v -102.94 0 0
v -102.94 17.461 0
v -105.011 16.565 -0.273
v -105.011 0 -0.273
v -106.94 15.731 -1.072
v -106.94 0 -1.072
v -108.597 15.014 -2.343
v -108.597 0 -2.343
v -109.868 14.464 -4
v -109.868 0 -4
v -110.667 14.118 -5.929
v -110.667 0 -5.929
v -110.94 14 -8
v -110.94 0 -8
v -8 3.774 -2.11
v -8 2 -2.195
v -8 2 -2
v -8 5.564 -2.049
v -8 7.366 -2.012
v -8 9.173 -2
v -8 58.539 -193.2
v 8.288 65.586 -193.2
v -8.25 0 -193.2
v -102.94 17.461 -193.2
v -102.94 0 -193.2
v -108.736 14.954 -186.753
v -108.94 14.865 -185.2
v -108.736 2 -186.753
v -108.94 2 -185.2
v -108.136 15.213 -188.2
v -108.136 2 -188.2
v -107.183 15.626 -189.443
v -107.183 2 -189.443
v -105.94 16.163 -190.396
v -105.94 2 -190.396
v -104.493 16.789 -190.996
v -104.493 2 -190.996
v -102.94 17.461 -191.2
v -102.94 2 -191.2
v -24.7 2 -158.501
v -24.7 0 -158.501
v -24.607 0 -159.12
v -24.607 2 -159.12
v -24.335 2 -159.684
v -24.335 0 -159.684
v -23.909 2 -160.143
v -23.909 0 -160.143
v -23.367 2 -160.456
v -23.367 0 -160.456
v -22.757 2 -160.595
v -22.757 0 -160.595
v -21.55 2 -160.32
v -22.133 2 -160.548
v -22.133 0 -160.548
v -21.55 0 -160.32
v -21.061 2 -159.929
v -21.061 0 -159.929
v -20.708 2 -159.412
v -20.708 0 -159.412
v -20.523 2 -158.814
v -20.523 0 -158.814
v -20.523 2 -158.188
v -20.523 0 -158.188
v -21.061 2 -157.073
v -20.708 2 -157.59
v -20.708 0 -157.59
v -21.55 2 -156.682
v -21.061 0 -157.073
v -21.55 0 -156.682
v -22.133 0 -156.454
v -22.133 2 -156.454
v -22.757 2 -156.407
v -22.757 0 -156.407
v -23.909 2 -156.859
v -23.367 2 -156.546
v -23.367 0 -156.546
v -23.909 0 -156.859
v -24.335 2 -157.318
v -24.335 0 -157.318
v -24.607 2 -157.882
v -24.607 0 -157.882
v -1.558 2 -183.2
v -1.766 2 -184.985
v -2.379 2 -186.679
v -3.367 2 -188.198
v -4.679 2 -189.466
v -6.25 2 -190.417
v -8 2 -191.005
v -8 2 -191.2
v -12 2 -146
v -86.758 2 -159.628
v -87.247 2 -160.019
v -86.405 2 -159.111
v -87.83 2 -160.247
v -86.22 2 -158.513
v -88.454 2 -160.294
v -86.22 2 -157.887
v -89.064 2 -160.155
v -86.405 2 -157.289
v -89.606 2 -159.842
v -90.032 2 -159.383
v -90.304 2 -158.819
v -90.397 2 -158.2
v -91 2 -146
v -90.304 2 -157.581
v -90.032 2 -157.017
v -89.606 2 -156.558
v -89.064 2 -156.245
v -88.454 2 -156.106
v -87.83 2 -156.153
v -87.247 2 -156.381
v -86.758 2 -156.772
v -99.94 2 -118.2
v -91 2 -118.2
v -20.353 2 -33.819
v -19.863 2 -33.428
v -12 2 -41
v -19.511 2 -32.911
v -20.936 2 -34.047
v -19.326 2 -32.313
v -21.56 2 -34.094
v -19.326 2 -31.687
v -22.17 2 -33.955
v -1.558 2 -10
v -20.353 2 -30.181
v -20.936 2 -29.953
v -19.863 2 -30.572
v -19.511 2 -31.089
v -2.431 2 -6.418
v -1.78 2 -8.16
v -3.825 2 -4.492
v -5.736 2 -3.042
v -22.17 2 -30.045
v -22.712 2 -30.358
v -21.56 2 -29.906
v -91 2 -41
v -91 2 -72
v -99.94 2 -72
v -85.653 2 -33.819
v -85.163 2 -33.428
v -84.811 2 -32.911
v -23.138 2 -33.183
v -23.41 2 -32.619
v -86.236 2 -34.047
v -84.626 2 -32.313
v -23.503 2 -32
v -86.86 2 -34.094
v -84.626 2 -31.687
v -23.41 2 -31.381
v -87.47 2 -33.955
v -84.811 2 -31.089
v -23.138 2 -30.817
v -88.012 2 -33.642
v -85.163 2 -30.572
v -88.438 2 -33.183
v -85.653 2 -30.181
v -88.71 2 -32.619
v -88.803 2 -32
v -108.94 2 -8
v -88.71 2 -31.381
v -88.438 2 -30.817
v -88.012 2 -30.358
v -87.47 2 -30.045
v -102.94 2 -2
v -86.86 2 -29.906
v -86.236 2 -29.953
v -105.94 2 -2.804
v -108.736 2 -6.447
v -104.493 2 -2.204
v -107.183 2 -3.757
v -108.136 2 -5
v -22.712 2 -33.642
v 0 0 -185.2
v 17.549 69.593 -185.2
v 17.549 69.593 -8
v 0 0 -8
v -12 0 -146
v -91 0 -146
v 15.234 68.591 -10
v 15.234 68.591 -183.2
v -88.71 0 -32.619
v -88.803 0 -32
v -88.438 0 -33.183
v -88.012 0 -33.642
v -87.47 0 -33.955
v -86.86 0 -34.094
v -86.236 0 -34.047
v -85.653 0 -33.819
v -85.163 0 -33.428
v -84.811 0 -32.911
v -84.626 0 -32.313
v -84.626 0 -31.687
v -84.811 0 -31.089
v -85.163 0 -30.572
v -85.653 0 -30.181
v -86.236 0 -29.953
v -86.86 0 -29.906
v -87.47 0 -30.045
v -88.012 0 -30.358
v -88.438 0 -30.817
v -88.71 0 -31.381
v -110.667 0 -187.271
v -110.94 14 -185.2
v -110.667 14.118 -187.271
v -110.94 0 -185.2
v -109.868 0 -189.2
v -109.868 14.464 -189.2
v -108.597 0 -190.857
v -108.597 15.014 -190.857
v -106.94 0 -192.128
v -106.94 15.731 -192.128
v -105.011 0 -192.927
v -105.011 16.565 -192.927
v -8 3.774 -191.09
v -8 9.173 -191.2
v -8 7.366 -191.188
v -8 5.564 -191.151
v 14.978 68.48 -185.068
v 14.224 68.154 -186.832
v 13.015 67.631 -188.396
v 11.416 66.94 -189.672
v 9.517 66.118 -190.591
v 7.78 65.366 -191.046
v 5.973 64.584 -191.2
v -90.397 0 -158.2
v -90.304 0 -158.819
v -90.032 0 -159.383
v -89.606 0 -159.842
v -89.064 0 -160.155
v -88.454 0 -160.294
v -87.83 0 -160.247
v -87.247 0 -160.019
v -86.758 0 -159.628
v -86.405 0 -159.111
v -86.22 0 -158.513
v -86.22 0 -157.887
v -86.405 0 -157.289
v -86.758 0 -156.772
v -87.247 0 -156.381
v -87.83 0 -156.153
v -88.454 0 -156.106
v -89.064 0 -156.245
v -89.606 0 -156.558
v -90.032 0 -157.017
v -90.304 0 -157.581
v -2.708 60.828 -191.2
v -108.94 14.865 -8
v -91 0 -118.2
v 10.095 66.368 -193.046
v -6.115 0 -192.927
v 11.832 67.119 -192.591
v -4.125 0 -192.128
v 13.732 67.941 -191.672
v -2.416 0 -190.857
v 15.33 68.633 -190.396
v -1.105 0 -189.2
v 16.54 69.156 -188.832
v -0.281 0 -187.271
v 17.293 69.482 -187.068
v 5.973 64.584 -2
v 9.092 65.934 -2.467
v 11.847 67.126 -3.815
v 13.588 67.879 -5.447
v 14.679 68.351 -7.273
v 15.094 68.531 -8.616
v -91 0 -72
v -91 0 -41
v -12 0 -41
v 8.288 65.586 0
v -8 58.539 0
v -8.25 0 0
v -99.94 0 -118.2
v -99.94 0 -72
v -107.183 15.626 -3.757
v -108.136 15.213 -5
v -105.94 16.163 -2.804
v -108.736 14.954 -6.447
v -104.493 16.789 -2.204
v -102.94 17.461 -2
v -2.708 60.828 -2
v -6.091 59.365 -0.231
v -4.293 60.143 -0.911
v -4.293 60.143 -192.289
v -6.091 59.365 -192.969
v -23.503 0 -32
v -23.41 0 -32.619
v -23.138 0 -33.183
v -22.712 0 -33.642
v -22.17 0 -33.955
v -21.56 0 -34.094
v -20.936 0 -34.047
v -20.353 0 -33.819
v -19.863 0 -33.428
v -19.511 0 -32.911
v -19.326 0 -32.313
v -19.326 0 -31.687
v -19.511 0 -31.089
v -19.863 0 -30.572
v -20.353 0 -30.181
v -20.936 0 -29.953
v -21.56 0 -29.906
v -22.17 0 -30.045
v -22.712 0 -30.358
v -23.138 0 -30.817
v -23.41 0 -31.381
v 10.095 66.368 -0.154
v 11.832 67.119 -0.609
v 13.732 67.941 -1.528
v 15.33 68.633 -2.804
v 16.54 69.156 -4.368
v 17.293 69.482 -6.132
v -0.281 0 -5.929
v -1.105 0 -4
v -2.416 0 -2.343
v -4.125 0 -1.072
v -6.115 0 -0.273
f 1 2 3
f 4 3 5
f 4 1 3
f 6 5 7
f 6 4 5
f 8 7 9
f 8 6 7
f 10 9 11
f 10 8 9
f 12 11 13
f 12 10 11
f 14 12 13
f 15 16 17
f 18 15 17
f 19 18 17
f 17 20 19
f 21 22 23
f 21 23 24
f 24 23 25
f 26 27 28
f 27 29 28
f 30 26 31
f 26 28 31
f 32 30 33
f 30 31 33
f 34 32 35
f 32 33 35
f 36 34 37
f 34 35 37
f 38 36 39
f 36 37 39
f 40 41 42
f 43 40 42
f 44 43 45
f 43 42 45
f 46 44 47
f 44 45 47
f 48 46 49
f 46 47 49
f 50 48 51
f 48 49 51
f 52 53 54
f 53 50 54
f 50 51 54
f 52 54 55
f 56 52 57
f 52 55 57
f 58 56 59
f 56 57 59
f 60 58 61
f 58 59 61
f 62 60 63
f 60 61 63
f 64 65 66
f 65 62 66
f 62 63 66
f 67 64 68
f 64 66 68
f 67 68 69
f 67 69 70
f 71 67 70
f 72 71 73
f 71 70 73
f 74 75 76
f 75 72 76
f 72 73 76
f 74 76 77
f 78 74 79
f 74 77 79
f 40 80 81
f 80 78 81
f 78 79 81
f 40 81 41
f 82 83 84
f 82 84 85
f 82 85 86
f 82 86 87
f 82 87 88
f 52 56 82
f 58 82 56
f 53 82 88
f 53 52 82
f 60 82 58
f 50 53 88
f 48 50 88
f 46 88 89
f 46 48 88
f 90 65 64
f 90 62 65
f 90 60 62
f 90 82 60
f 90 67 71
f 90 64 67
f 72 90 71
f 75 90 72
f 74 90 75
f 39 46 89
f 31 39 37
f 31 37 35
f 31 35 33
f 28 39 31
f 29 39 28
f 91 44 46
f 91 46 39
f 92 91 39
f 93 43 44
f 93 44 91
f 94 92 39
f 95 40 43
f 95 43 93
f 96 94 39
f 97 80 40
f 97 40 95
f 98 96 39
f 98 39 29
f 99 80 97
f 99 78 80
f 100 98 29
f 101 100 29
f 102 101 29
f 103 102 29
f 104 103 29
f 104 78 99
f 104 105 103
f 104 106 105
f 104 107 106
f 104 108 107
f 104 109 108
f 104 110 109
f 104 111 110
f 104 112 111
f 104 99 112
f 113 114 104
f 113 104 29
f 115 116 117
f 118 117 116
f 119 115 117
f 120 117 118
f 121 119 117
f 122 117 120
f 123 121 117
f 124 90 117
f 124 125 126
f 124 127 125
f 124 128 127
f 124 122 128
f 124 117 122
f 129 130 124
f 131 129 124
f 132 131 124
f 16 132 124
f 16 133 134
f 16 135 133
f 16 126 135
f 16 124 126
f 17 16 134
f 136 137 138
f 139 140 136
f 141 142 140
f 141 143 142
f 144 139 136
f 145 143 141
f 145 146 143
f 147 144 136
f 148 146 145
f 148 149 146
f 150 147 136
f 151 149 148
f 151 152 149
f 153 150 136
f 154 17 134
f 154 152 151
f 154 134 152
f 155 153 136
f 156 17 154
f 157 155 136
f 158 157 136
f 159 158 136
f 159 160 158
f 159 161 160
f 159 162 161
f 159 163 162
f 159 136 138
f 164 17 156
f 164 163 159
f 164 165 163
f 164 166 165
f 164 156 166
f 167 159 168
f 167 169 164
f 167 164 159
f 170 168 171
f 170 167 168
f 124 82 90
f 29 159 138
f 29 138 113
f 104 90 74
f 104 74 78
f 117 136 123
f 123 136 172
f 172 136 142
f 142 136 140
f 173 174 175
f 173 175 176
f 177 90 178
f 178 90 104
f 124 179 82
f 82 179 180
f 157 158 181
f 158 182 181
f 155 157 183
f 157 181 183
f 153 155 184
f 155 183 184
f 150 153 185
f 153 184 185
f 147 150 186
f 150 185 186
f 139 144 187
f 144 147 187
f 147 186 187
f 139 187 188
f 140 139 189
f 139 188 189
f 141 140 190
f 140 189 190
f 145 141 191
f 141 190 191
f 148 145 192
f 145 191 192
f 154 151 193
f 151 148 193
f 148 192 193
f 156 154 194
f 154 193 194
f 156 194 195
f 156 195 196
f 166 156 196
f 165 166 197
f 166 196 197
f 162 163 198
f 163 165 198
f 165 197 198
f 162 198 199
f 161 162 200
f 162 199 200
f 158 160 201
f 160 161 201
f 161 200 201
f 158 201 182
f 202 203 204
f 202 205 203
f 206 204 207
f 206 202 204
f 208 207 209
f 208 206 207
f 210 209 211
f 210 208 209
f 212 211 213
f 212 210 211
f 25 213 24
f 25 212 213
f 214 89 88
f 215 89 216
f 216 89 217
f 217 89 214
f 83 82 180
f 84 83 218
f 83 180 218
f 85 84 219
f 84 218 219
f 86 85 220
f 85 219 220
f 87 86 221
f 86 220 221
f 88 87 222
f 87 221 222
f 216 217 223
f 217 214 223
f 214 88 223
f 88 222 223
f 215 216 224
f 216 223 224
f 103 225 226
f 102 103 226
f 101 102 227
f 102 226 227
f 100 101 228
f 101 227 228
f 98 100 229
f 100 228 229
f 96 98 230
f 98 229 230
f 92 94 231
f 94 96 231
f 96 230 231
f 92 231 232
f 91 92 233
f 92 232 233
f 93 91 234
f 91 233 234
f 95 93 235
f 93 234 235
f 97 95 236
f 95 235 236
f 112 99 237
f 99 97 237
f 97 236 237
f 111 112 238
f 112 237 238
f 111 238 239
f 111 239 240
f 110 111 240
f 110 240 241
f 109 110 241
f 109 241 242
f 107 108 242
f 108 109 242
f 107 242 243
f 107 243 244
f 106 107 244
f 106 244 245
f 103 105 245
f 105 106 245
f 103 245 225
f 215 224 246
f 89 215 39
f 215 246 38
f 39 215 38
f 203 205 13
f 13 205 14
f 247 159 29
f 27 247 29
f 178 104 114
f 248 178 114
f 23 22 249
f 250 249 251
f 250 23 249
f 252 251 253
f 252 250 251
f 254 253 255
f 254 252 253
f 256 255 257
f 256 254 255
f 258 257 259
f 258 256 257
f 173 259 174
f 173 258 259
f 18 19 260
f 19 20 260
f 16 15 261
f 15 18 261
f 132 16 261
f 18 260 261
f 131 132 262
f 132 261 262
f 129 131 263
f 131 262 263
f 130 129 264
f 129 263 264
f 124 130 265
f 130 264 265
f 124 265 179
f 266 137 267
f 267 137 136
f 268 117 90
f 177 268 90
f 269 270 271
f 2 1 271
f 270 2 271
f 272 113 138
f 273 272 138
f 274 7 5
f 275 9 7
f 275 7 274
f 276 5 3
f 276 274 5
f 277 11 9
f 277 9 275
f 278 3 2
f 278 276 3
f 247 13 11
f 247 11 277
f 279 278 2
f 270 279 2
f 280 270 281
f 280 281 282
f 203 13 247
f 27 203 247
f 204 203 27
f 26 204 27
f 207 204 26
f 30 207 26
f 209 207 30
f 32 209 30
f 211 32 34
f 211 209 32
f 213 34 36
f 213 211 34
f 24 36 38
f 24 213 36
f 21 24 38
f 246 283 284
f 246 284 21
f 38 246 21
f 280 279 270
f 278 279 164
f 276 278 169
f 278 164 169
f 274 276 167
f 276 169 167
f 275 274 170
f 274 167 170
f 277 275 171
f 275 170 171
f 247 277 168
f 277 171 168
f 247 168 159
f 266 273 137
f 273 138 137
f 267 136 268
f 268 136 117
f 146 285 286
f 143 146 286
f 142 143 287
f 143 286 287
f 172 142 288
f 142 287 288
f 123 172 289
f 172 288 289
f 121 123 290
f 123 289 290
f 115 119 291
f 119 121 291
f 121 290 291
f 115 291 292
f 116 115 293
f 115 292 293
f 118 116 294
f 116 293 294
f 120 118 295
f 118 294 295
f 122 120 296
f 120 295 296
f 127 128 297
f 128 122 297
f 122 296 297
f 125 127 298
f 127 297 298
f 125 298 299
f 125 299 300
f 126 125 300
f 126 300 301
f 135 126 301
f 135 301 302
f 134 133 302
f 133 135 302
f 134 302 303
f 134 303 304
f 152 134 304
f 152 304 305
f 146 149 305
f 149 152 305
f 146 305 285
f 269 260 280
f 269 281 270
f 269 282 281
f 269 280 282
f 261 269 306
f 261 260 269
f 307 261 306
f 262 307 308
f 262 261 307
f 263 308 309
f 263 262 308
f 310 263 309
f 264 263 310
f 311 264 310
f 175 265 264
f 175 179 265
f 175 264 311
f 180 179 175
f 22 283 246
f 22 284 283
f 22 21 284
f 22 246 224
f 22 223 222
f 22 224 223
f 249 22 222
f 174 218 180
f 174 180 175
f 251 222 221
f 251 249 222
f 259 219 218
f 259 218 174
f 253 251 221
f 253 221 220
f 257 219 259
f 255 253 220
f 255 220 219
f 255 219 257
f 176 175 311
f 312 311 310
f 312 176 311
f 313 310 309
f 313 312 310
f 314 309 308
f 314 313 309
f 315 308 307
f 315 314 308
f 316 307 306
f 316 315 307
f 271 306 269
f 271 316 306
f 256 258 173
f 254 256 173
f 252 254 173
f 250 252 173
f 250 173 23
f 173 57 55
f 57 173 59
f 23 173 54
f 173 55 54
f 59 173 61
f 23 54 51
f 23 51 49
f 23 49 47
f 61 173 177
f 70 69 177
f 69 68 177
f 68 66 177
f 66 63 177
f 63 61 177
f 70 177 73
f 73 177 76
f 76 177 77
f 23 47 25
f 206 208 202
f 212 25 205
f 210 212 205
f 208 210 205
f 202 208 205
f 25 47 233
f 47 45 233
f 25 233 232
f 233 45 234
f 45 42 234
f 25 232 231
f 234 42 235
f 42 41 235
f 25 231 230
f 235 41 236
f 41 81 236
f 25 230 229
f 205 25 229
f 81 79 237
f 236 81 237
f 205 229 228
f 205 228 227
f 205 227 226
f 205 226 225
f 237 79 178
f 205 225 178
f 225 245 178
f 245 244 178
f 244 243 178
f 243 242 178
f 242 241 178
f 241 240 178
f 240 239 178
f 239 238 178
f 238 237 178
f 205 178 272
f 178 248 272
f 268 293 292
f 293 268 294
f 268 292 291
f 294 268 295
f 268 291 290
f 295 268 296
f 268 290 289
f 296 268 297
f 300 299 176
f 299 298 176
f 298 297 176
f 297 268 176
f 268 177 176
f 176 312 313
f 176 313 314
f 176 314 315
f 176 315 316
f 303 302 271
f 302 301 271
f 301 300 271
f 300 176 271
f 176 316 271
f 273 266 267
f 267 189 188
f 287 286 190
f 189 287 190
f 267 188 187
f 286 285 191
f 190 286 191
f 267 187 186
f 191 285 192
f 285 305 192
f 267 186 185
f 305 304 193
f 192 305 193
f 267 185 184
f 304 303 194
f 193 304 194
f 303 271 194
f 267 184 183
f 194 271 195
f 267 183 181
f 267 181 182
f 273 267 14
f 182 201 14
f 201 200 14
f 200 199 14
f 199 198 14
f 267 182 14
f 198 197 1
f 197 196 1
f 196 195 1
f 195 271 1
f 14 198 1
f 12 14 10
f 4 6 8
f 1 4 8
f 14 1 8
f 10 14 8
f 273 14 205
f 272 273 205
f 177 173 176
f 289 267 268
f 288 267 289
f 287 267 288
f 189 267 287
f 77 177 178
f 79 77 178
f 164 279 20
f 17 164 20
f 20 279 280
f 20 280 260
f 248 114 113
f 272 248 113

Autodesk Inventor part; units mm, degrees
ref_plane "YZ Plane" through (0, 0, 0) normal (1, 0, 0) x (0, 1, 0)
ref_plane "XZ Plane" through (0, 0, 0) normal (0, 1, 0) x (-1, 0, 0)
sketch "Sketch1" plane through (0, 0, 0) normal (0, 1, 0) x (-1, 0, 0)
  line L0 (8, 0) -> (102.94, 0)
  line L1 (110.94, -8) -> (110.94, -185.2)
  line L2 (102.94, -193.2) -> (8, -193.2)
  line L3 (0, -185.2) -> (0, -8)
  circle A0 centre (86.7029, -32) radius 2.1
  circle A1 centre (88.297, -158.2) radius 2.1
  circle A2 centre (22.6, -158.501) radius 2.1
  circle A3 centre (21.4029, -32) radius 2.1
  arc A4 (110.94, -8) -> (102.94, 0) centre (102.94, -8) ccw
  arc A5 (8, 0) -> (0, -8) centre (8, -8) ccw
  arc A6 (0, -185.2) -> (8, -193.2) centre (8, -185.2) ccw
  arc A7 (102.94, -193.2) -> (110.94, -185.2) centre (102.94, -185.2) ccw
  point P0 (0, 0)
  dimension "d0" = 110.94
  dimension "d1" = 193.2
  dimension "d2" = 4.2
  dimension "d3" = 4.2
  dimension "d4" = 65.3
  dimension "d5" = 65.697
  dimension "d6" = 4.2
  dimension "d7" = 4.2
  dimension "d8" = 126.2
  dimension "d9" = 126.501
  dimension "d10" = 0
  dimension "d11" = 22.6
  dimension "d12" = 35
  dimension "d13" = 8
extrude "Extrusion1" add sketch "Sketch1" along normal blind 2
sketch "Sketch3" plane through (0, 2, 0) normal (0, 1, 0) x (1, 0, 0)
  line L0 (-91, 41) -> (-12, 41)
  line L1 (-12, 41) -> (-12, 146)
  line L2 (-12, 146) -> (-91, 146)
  line L3 (-99.94, 72) -> (-91, 72)
  line L4 (-91, 118.2) -> (-99.94, 118.2)
  line L5 (-99.94, 118.2) -> (-99.94, 72)
  circle A0 centre (-88.297, 158.2) radius 2.1 projected
  circle A1 centre (-86.7029, 32) radius 2.1 projected
  line L6 (-91, 146) -> (-91, 118.2)
  line L7 (-91, 72) -> (-91, 41)
  line L8 (-102.94, 0) -> (-8, 0) projected
  line L9 (0, 8) -> (0, 185.2) projected
  line L10 (-110.94, 185.2) -> (-110.94, 8) projected
  point P0 (0, 0)
  dimension "d22" = 105
  dimension "d26" = 40
  dimension "d27" = 40
  dimension "d32" = 12
  dimension "d33" = 41
  dimension "d34" = 11
  dimension "d35" = 79
  dimension "d36" = 79
extrude "Extrusion3" cut sketch "Sketch3" against normal blind 7.5 contours L7 L3 L5 L4 L6 L2 L1 L0
sketch "Sketch4" plane through (0, 2, 0) normal (0, 1, 0) x (1, 0, 0)
  line L0 (-91, 146) -> (-12, 146) projected
  line L1 (-12, 146) -> (-12, 41) projected
  line L2 (-12, 41) -> (-91, 41) projected
  line L3 (-91, 41) -> (-91, 72) projected
  line L4 (-91, 72) -> (-99.94, 72) projected
  line L5 (-99.94, 72) -> (-99.94, 118.2) projected
  line L6 (-99.94, 118.2) -> (-91, 118.2) projected
  line L7 (-91, 118.2) -> (-91, 146) projected
  line L8 (-8, 193.2) -> (-102.94, 193.2) projected
  arc A0 (-102.94, 193.2) -> (-110.94, 185.2) centre (-102.94, 185.2) ccw projected
  line L9 (-110.94, 185.2) -> (-110.94, 8) projected
  arc A1 (-110.94, 8) -> (-102.94, 0) centre (-102.94, 8) ccw projected
  line L10 (-102.94, 0) -> (-8, 0) projected
  arc A2 (-8, 0) -> (0, 8) centre (-8, 8) ccw projected
  line L11 (0, 8) -> (0, 185.2) projected
  arc A3 (0, 185.2) -> (-8, 193.2) centre (-8, 185.2) ccw projected
  circle A4 centre (-86.7029, 32) radius 2.1 projected
  circle A5 centre (-88.297, 158.2) radius 2.1 projected
  circle A6 centre (-22.6, 158.501) radius 2.1 projected
  circle A7 centre (-21.4029, 32) radius 2.1 projected
  arc A8 (-108.94, 8) -> (-102.94, 2) centre (-102.94, 8) ccw
  line L12 (-108.94, 8) -> (-108.94, 185.2)
  arc A9 (-102.94, 191.2) -> (-108.94, 185.2) centre (-102.94, 185.2) ccw
  line L13 (-102.94, 191.2) -> (-8, 191.2)
  arc A10 (-2, 185.2) -> (-8, 191.2) centre (-8, 185.2) ccw
  line L14 (-2, 185.2) -> (-2, 8)
  arc A11 (-8, 2) -> (-2, 8) centre (-8, 8) ccw
  line L15 (-8, 2) -> (-102.94, 2)
  point P0 (0, 0)
  dimension "d37" = 2
extrude "Extrusion4" add sketch "Sketch4" along normal blind 60 contours A3 L11 A2 L10 A1 L9 A0 L8
sketch "Sketch5" plane through (-102.94, 0, 0) normal (0, 0, 1) x (1, 0, 0)
  line L0 (-8, 0) -> (-8, 62) projected
  line L1 (-8, 14) -> (102.94, 62)
  line L2 (102.94, 0) -> (102.94, 62) projected
  line L3 (0, 0) -> (-8, 0) projected
  line L4 (0, 62) -> (-8, 62) projected
  line L5 (-8, 14) -> (-8, 62)
  line L6 (102.94, 62) -> (94.94, 62) projected
  line L7 (-8, 62) -> (102.94, 62)
  dimension "d40" = 14
  dimension "d41" = 0
extrude "Extrusion5" cut sketch "Sketch5" along normal mid plane 1000
sketch "Sketch6" plane through (-8, 0, -193.2) normal (0, 0, -1) x (-1, 0, 0)
  line L0 (102.94, 0) -> (102.94, 14) projected
  line L1 (102.94, 14) -> (-25.549, 69.5929)
  line L2 (94.94, 17.4613) -> (102.94, 14) projected
  line L3 (-25.549, 69.5929) -> (-8, 0)
  line L4 (0, 0) -> (-8, 0) projected
  line L5 (-8, 0) -> (0, 0)
  line L6 (0, 0) -> (0, 58.5387) projected
  line L7 (0, 0) -> (0, 58.5387)
  point P0 (-8, 62)
  dimension "d47" = 140
extrude "Extrusion6" add sketch "Sketch6" against normal blind 193.2
fillet "Fillet1" radius 8 2 edges at (8.7745, 34.7964, -193.2) (8.7745, 34.7964, 0)
ref_plane "Work Plane1" through (17.549, 69.5929, -193.2) normal (0.2445129, 0.9696461, 0) x (0, 0, 1)
sketch "Sketch9" plane through (17.549, 69.5929, -193.2) normal (0.2445129, 0.9696461, 0) x (0, 0, 1)
  line L0 (2, -22.0706) -> (191.2, -22.0706) projected
  line L1 (191.2, -100.3044) -> (191.2, -8.2462) projected
  line L2 (2, -22.0706) -> (191.2, -22.0706)
  line L3 (191.2, -22.0706) -> (191.2, -10)
  line L4 (183.2, -2) -> (10, -2)
  line L5 (2, -10) -> (2, -22.0706)
  line L6 (8, 0) -> (185.2, 0) projected
  arc A0 (191.2, -10) -> (183.2, -2) centre (183.2, -10) ccw
  arc A1 (10, -2) -> (2, -10) centre (10, -10) ccw
  point P0 (193.2, 0)
  point P1 (191.2, -2)
  dimension "d55" = 2
  dimension "d56" = 8
extrude "Extrusion7" cut sketch "Sketch9" against normal up to surface surface through (-55.47, 2, -96.6) normal (0, 1, 0)
sketch "Sketch10" plane through (-110.94, 14, -8) normal (-0.397092, 0.9177788, 0) x (0.9177788, 0.397092, 0)
  line L0 (8.7167, -6) -> (127.3869, -6) projected
  ellipse E0 centre (8.7167, 0) end of major axis (15.2542, 0) minor radius 6 (2.1792, 0) -> (8.7167, -6) ccw projected
  line L1 (2.1792, 177.2) -> (2.1792, 0) projected
  ellipse E1 centre (8.7167, 177.2) end of major axis (15.2542, 177.2) minor radius 6 (8.7167, 183.2) -> (2.1792, 177.2) ccw projected
  line L2 (127.3869, 183.2) -> (8.7167, 183.2) projected
  ellipse E2 centre (127.3869, 175.2) end of major axis (137.4774, 175.2) minor radius 8 (137.4774, 175.2) -> (127.3869, 183.2) ccw projected
  line L3 (137.4774, 175.2) -> (137.4774, 2) projected
  ellipse E3 centre (127.3869, 2) end of major axis (117.2964, 2) minor radius 8 (127.3869, -6) -> (137.4774, 2) ccw projected
  ellipse E4 centre (129.9095, 0) end of major axis (140, 0) minor radius 8 (129.9095, -8) -> (140, 0) ccw projected
  line L4 (140, 177.2) -> (140, 0) projected
  ellipse E5 centre (129.9095, 177.2) end of major axis (140, 177.2) minor radius 8 (140, 177.2) -> (129.9095, 185.2) ccw projected
  line L5 (8.7167, 185.2) -> (129.9095, 185.2) projected
  ellipse E6 centre (8.7167, 177.2) end of major axis (0, 177.2) minor radius 8 (8.7167, 185.2) -> (0, 177.2) ccw projected
  line L6 (0, 0) -> (0, 177.2) projected
  ellipse E7 centre (8.7167, 0) end of major axis (0, 0) minor radius 8 (0, 0) -> (8.7167, -8) ccw projected
  line L7 (129.9095, -8) -> (8.7167, -8) projected
  point P0 (96.2591, -8)
properties part number "Front"
